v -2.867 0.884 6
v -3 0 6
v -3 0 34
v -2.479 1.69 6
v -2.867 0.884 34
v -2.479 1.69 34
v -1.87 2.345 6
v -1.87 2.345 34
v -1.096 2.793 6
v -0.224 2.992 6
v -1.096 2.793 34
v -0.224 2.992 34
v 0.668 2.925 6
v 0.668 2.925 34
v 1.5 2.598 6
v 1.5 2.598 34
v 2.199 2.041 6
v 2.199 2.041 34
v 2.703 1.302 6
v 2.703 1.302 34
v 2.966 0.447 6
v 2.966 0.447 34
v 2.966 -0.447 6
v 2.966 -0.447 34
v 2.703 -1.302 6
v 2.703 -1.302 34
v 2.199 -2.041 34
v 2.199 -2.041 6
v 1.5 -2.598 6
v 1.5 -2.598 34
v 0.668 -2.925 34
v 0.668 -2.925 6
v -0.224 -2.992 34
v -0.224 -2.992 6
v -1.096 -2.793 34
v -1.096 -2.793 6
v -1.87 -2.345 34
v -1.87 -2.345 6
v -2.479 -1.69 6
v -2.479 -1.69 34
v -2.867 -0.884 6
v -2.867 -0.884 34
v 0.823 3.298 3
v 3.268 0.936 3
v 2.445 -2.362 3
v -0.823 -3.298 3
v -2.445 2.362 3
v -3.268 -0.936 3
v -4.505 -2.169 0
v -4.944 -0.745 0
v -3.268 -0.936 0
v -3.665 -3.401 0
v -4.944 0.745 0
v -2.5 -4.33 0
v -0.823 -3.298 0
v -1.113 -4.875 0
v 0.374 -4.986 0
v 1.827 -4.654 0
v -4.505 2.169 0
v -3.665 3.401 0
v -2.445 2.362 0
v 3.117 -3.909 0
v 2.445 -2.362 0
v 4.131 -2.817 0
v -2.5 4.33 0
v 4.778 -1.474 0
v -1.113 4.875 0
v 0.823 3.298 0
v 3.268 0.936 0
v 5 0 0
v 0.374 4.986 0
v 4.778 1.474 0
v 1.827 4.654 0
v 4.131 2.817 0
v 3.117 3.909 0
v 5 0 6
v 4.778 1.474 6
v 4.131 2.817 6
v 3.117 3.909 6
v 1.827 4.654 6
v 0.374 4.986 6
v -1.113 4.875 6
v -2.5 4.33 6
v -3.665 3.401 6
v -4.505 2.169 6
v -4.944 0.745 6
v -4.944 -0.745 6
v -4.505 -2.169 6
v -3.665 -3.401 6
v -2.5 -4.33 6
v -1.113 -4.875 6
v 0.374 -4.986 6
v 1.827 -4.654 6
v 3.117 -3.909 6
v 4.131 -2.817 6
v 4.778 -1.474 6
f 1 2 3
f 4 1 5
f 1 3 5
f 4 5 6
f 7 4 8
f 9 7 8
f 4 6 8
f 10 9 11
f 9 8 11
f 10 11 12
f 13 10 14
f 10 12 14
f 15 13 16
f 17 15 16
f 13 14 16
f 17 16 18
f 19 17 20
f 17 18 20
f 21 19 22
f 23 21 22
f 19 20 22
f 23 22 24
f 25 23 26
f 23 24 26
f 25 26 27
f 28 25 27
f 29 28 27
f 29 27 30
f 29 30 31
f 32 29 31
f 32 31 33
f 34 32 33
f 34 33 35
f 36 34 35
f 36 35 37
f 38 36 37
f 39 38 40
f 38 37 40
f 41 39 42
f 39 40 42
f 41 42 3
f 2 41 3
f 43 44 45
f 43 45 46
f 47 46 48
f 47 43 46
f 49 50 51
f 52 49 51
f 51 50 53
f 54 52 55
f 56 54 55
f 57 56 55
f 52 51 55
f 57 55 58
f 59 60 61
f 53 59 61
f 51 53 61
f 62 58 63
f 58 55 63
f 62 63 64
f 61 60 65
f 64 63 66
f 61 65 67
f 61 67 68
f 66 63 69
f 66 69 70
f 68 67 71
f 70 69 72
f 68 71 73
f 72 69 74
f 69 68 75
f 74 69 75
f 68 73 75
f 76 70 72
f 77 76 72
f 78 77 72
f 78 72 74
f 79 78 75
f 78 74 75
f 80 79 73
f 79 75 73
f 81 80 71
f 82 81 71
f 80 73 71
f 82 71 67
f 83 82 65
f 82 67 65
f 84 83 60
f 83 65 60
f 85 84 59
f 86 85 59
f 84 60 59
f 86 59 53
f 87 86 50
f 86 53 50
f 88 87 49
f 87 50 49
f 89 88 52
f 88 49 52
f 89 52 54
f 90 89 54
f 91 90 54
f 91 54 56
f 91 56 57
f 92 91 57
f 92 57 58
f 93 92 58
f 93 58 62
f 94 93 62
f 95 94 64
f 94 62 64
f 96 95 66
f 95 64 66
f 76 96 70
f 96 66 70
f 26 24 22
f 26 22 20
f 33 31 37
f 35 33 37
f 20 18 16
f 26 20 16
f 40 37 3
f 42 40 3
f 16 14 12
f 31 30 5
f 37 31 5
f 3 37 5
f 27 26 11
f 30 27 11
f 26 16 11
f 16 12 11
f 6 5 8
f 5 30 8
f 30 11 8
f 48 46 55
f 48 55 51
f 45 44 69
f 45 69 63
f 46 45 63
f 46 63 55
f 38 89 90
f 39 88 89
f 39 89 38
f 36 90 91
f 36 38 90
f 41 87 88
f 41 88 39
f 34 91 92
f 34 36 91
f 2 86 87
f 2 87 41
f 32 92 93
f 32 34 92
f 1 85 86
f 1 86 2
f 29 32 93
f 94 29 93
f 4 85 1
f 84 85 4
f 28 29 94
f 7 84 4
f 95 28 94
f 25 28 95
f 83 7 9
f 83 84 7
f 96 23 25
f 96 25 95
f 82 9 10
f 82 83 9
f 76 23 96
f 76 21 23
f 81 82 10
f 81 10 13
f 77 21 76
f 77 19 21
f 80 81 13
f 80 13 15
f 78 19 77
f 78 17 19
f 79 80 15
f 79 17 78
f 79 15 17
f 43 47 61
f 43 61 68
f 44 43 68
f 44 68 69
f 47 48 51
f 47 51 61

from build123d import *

# Parameters (mm, degrees)
SKETCH_1_R                = 5
EXTRUDE_1_DEPTH           = 6
CUT_EXTRUDE_START         = -3
CUT_EXTRUDE_1_DEPTH       = 3
CUT_EXTRUDE_START_2       = -34
CUT_EXTRUDE_1_2_OUTLINE_R = 3
CUT_EXTRUDE_1_2_DEPTH     = 28


# Read off the part's stored shape, not the designer's step: ｶｯﾄ - 押し出し1
with BuildPart() as part:
    # ｽｹｯﾁ1 → ﾎﾞｽ - 押し出し1 (new body)
    with BuildSketch(Plane.XY):
        Circle(SKETCH_1_R)
    extrude(amount=EXTRUDE_1_DEPTH)

    # ｶｯﾄ - 押し出し1 outline → ｶｯﾄ - 押し出し1 (cut)
    with BuildSketch(Plane(origin=(0, 0, 0), x_dir=(-1, 0, 0), z_dir=(0, 0, -1)).offset(CUT_EXTRUDE_START)):
        Polygon((3.267510606, -0.936315364), (2.444628194, 2.36158951), (-0.822882412, 3.297904873), (-3.267510606, 0.936315364), (-2.444628194, -2.36158951), (0.822882412, -3.297904873), align=None)
    extrude(amount=CUT_EXTRUDE_1_DEPTH, mode=Mode.SUBTRACT)

    # Cut-Extrude 1 2 outline → Cut-Extrude 1 2 (add)
    with BuildSketch(Plane(origin=(0, 0, 0), x_dir=(-1, 0, 0), z_dir=(0, 0, -1)).offset(CUT_EXTRUDE_START_2)):
        Circle(CUT_EXTRUDE_1_2_OUTLINE_R)
    extrude(amount=CUT_EXTRUDE_1_2_DEPTH)


solid = part.part
